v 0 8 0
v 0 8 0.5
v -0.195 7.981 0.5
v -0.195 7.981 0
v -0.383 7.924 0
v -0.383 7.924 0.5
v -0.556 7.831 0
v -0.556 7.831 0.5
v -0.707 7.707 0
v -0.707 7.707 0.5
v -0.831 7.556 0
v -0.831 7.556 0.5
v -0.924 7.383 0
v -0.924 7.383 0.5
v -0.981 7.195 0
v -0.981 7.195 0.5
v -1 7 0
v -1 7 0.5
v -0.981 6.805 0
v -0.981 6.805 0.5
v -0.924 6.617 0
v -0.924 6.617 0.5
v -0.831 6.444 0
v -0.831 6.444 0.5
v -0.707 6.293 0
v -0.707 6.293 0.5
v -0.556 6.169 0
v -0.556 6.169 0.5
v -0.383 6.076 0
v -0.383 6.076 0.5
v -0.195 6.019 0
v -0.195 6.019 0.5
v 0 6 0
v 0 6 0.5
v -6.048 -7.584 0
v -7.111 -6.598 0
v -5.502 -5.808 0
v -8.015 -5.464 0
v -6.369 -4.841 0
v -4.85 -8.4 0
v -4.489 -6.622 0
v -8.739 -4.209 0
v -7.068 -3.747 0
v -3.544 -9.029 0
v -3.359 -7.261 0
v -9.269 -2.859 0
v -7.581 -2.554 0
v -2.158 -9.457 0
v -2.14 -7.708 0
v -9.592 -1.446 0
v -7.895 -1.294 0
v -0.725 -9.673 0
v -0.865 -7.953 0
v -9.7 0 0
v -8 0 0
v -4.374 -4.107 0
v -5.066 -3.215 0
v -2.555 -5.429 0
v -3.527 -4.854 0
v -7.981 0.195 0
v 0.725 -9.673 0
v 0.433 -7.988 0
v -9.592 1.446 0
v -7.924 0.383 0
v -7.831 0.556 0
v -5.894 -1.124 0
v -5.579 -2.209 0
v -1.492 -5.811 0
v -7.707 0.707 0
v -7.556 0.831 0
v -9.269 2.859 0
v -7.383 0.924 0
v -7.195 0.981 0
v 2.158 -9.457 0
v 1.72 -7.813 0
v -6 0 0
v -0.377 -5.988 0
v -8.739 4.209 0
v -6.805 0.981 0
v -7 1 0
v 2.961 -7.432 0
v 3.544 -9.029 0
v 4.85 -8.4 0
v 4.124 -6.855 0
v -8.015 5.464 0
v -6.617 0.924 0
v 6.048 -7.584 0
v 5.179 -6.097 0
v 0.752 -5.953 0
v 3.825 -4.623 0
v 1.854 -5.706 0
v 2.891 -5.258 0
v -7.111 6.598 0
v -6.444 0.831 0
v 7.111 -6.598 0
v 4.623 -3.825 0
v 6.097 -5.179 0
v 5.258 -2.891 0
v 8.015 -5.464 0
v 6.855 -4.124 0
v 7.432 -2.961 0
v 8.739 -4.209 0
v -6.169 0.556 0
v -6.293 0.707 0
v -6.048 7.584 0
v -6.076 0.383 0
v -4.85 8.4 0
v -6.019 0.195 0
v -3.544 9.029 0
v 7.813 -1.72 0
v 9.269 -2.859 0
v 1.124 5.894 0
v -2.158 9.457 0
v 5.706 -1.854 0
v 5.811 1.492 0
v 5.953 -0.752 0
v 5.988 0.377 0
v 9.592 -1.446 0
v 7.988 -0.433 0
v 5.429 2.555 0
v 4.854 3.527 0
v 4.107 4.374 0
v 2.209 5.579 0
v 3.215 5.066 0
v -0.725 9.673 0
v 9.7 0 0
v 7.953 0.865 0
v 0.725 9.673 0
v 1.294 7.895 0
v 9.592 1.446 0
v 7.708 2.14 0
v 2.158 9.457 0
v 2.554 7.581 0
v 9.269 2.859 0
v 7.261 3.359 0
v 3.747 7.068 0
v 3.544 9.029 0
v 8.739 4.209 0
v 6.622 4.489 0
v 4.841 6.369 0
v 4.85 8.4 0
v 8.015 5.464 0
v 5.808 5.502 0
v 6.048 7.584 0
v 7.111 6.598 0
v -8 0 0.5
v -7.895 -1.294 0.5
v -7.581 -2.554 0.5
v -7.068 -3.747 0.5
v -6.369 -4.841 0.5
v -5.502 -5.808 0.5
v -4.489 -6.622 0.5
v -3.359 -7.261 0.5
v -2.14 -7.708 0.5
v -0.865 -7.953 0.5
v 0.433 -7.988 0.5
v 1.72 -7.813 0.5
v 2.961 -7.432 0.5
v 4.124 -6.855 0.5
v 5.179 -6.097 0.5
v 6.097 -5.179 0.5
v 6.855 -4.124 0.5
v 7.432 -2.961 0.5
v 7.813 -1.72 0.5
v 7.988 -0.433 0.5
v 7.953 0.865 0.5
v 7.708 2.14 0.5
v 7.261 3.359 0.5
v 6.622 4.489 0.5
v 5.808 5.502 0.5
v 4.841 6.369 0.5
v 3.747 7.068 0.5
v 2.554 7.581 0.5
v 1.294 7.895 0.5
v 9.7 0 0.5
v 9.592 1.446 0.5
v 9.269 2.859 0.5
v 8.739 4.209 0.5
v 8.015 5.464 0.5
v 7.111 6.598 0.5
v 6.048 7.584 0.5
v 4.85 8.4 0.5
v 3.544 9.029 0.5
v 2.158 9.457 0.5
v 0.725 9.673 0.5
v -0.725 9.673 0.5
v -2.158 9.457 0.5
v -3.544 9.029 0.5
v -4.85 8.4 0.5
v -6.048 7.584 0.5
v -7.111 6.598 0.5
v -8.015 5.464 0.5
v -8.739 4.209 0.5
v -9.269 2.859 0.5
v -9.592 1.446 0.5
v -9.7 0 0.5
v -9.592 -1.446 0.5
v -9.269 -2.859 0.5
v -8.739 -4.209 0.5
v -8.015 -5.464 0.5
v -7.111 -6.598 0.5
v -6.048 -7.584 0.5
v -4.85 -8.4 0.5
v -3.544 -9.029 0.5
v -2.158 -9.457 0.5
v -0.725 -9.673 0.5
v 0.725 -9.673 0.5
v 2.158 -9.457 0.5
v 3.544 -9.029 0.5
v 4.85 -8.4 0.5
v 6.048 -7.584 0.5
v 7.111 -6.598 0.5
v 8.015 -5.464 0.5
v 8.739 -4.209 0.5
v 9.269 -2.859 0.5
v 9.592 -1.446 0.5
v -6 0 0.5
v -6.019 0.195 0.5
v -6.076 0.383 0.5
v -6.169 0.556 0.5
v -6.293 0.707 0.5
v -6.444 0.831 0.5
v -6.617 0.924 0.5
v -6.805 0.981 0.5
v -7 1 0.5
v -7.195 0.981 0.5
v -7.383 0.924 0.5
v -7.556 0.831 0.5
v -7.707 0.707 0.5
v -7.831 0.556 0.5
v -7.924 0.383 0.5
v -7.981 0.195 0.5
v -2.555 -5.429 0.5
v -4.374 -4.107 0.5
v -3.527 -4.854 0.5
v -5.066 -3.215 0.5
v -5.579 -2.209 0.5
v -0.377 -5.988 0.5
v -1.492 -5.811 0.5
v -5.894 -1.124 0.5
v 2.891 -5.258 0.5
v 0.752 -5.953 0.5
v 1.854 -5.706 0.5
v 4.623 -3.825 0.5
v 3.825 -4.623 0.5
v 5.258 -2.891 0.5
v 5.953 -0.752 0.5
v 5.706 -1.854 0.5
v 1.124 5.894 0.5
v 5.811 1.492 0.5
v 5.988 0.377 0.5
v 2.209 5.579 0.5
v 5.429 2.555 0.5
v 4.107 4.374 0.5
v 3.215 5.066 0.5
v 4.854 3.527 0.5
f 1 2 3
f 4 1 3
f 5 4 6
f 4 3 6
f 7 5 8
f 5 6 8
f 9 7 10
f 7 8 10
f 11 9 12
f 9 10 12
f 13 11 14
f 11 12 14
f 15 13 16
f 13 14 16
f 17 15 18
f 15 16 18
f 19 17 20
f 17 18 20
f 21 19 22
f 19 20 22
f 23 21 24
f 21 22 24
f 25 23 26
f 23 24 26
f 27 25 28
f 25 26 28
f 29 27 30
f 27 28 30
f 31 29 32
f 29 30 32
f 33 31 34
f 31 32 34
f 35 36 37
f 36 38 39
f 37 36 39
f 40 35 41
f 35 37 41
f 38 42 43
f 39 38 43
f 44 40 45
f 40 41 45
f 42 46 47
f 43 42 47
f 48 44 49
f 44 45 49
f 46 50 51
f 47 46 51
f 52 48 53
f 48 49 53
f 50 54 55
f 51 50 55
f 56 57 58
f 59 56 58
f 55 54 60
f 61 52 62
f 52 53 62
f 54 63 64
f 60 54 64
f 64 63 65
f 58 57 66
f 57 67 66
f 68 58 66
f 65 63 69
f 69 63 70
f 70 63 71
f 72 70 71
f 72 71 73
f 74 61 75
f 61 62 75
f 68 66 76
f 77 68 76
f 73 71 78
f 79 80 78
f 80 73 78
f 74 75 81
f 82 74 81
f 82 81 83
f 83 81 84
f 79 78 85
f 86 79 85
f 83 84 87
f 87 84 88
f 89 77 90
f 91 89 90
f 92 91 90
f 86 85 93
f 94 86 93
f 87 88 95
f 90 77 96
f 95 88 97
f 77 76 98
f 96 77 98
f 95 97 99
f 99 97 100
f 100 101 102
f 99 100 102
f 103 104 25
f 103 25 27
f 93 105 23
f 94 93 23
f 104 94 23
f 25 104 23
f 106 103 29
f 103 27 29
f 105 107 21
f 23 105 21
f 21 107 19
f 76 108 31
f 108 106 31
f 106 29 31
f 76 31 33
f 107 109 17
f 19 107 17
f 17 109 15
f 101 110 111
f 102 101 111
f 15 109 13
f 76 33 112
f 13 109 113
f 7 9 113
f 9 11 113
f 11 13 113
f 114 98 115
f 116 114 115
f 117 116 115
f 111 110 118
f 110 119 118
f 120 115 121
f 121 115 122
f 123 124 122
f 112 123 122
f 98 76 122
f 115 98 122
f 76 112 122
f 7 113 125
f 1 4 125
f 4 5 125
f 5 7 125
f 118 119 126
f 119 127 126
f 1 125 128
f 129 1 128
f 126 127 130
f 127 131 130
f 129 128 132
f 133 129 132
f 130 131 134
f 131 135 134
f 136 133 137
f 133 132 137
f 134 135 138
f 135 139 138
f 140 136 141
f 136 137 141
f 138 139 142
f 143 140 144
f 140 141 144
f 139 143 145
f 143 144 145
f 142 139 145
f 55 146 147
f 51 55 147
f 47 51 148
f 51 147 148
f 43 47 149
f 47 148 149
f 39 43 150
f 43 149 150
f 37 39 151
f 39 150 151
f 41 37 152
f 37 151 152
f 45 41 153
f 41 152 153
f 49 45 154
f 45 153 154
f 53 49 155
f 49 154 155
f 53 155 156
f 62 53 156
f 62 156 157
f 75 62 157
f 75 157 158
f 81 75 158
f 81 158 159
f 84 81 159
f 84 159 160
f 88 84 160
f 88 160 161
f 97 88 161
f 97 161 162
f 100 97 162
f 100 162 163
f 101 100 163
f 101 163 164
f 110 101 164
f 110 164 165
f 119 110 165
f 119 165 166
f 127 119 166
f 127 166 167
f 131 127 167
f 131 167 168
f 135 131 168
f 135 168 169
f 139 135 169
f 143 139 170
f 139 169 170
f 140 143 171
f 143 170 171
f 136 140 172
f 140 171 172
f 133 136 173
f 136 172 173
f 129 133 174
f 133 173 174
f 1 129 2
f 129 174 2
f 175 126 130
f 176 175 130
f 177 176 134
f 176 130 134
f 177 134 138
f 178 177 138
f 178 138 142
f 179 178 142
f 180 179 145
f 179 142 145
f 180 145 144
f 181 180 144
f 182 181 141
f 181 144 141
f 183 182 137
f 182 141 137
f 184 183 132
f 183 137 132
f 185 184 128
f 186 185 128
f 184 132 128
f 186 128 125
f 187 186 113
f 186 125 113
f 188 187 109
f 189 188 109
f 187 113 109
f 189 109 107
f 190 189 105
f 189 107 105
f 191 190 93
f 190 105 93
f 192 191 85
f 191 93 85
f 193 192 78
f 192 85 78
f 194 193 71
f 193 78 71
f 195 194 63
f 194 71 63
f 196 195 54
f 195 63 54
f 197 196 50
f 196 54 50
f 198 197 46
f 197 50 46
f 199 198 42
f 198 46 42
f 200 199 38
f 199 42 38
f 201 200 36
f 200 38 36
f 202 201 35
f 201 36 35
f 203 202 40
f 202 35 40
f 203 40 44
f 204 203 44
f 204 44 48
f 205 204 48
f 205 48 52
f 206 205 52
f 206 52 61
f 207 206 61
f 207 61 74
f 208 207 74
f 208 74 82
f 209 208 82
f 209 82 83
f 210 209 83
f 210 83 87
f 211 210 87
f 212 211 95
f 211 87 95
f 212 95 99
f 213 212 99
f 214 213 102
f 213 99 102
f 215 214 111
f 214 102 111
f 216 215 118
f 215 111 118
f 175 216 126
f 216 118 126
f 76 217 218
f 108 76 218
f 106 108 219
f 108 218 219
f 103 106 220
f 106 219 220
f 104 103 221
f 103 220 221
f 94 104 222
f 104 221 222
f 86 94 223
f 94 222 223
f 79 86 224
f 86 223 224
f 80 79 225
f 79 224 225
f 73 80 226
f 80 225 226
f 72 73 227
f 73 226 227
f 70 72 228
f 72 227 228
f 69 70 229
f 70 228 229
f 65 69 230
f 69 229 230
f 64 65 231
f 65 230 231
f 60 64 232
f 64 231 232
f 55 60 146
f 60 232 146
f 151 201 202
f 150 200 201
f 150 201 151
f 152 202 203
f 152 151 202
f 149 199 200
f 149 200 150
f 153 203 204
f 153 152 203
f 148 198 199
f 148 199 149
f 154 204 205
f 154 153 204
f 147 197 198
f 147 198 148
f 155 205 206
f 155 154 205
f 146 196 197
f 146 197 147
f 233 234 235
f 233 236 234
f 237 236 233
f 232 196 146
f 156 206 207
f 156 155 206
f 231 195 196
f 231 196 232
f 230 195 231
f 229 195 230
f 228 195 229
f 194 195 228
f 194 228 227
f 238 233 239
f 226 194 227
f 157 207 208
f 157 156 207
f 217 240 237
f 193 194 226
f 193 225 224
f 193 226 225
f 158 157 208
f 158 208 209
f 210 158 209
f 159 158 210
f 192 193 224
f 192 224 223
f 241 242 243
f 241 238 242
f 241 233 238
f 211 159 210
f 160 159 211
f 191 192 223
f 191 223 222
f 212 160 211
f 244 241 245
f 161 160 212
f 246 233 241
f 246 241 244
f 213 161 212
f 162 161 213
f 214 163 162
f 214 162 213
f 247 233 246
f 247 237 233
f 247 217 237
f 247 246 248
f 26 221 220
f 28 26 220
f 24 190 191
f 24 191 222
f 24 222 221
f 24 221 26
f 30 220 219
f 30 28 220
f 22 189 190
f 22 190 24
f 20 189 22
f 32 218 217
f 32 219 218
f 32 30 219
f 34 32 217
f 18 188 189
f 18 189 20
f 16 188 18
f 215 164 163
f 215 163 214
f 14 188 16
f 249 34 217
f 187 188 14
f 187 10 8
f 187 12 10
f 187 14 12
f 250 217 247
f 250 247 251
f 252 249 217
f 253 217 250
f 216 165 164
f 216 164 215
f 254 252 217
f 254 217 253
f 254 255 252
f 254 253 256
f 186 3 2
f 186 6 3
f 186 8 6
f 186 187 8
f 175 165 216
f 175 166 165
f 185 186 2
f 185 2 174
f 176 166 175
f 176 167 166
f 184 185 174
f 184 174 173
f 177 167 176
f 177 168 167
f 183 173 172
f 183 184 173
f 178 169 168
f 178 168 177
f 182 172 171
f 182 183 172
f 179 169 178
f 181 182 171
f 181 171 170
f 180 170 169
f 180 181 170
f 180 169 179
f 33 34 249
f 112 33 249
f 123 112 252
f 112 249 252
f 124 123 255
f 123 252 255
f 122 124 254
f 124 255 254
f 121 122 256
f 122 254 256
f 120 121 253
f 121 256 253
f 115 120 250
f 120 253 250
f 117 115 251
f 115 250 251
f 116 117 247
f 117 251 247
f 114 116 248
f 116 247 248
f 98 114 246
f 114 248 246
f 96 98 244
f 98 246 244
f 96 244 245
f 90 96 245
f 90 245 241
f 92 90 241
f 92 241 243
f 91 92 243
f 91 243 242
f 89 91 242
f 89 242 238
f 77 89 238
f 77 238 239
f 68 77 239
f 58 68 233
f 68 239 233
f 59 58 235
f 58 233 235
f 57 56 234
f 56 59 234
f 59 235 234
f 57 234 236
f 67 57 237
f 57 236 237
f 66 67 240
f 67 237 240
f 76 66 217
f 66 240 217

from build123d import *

# Parameters (mm, degrees)
SKETCH_1_R          = 9.7
EXTRUDE_1_DEPTH     = 0.5
CUT_EXTRUDE_1_DEPTH = 14.726980731


with BuildPart() as part:
    # 草图1 → 凸台-拉伸1 (new body)
    with BuildSketch(Plane.XY):
        Circle(SKETCH_1_R)
    extrude(amount=EXTRUDE_1_DEPTH)

    # 草图3 → 切除-拉伸1 (cut, through all)
    with BuildSketch(Plane.XY.offset(0.5)):
        with BuildLine():
            ThreePointArc((-8, 0), (5.656854249, -5.656854249), (0, 8))
            ThreePointArc((0, 8), (-1, 7), (0, 6))
            ThreePointArc((0, 6), (4.242640687, -4.242640687), (-6, 0))
            ThreePointArc((-6, 0), (-7, 1), (-8, 0))
        make_face()
    extrude(amount=-CUT_EXTRUDE_1_DEPTH, mode=Mode.SUBTRACT)


solid = part.part
